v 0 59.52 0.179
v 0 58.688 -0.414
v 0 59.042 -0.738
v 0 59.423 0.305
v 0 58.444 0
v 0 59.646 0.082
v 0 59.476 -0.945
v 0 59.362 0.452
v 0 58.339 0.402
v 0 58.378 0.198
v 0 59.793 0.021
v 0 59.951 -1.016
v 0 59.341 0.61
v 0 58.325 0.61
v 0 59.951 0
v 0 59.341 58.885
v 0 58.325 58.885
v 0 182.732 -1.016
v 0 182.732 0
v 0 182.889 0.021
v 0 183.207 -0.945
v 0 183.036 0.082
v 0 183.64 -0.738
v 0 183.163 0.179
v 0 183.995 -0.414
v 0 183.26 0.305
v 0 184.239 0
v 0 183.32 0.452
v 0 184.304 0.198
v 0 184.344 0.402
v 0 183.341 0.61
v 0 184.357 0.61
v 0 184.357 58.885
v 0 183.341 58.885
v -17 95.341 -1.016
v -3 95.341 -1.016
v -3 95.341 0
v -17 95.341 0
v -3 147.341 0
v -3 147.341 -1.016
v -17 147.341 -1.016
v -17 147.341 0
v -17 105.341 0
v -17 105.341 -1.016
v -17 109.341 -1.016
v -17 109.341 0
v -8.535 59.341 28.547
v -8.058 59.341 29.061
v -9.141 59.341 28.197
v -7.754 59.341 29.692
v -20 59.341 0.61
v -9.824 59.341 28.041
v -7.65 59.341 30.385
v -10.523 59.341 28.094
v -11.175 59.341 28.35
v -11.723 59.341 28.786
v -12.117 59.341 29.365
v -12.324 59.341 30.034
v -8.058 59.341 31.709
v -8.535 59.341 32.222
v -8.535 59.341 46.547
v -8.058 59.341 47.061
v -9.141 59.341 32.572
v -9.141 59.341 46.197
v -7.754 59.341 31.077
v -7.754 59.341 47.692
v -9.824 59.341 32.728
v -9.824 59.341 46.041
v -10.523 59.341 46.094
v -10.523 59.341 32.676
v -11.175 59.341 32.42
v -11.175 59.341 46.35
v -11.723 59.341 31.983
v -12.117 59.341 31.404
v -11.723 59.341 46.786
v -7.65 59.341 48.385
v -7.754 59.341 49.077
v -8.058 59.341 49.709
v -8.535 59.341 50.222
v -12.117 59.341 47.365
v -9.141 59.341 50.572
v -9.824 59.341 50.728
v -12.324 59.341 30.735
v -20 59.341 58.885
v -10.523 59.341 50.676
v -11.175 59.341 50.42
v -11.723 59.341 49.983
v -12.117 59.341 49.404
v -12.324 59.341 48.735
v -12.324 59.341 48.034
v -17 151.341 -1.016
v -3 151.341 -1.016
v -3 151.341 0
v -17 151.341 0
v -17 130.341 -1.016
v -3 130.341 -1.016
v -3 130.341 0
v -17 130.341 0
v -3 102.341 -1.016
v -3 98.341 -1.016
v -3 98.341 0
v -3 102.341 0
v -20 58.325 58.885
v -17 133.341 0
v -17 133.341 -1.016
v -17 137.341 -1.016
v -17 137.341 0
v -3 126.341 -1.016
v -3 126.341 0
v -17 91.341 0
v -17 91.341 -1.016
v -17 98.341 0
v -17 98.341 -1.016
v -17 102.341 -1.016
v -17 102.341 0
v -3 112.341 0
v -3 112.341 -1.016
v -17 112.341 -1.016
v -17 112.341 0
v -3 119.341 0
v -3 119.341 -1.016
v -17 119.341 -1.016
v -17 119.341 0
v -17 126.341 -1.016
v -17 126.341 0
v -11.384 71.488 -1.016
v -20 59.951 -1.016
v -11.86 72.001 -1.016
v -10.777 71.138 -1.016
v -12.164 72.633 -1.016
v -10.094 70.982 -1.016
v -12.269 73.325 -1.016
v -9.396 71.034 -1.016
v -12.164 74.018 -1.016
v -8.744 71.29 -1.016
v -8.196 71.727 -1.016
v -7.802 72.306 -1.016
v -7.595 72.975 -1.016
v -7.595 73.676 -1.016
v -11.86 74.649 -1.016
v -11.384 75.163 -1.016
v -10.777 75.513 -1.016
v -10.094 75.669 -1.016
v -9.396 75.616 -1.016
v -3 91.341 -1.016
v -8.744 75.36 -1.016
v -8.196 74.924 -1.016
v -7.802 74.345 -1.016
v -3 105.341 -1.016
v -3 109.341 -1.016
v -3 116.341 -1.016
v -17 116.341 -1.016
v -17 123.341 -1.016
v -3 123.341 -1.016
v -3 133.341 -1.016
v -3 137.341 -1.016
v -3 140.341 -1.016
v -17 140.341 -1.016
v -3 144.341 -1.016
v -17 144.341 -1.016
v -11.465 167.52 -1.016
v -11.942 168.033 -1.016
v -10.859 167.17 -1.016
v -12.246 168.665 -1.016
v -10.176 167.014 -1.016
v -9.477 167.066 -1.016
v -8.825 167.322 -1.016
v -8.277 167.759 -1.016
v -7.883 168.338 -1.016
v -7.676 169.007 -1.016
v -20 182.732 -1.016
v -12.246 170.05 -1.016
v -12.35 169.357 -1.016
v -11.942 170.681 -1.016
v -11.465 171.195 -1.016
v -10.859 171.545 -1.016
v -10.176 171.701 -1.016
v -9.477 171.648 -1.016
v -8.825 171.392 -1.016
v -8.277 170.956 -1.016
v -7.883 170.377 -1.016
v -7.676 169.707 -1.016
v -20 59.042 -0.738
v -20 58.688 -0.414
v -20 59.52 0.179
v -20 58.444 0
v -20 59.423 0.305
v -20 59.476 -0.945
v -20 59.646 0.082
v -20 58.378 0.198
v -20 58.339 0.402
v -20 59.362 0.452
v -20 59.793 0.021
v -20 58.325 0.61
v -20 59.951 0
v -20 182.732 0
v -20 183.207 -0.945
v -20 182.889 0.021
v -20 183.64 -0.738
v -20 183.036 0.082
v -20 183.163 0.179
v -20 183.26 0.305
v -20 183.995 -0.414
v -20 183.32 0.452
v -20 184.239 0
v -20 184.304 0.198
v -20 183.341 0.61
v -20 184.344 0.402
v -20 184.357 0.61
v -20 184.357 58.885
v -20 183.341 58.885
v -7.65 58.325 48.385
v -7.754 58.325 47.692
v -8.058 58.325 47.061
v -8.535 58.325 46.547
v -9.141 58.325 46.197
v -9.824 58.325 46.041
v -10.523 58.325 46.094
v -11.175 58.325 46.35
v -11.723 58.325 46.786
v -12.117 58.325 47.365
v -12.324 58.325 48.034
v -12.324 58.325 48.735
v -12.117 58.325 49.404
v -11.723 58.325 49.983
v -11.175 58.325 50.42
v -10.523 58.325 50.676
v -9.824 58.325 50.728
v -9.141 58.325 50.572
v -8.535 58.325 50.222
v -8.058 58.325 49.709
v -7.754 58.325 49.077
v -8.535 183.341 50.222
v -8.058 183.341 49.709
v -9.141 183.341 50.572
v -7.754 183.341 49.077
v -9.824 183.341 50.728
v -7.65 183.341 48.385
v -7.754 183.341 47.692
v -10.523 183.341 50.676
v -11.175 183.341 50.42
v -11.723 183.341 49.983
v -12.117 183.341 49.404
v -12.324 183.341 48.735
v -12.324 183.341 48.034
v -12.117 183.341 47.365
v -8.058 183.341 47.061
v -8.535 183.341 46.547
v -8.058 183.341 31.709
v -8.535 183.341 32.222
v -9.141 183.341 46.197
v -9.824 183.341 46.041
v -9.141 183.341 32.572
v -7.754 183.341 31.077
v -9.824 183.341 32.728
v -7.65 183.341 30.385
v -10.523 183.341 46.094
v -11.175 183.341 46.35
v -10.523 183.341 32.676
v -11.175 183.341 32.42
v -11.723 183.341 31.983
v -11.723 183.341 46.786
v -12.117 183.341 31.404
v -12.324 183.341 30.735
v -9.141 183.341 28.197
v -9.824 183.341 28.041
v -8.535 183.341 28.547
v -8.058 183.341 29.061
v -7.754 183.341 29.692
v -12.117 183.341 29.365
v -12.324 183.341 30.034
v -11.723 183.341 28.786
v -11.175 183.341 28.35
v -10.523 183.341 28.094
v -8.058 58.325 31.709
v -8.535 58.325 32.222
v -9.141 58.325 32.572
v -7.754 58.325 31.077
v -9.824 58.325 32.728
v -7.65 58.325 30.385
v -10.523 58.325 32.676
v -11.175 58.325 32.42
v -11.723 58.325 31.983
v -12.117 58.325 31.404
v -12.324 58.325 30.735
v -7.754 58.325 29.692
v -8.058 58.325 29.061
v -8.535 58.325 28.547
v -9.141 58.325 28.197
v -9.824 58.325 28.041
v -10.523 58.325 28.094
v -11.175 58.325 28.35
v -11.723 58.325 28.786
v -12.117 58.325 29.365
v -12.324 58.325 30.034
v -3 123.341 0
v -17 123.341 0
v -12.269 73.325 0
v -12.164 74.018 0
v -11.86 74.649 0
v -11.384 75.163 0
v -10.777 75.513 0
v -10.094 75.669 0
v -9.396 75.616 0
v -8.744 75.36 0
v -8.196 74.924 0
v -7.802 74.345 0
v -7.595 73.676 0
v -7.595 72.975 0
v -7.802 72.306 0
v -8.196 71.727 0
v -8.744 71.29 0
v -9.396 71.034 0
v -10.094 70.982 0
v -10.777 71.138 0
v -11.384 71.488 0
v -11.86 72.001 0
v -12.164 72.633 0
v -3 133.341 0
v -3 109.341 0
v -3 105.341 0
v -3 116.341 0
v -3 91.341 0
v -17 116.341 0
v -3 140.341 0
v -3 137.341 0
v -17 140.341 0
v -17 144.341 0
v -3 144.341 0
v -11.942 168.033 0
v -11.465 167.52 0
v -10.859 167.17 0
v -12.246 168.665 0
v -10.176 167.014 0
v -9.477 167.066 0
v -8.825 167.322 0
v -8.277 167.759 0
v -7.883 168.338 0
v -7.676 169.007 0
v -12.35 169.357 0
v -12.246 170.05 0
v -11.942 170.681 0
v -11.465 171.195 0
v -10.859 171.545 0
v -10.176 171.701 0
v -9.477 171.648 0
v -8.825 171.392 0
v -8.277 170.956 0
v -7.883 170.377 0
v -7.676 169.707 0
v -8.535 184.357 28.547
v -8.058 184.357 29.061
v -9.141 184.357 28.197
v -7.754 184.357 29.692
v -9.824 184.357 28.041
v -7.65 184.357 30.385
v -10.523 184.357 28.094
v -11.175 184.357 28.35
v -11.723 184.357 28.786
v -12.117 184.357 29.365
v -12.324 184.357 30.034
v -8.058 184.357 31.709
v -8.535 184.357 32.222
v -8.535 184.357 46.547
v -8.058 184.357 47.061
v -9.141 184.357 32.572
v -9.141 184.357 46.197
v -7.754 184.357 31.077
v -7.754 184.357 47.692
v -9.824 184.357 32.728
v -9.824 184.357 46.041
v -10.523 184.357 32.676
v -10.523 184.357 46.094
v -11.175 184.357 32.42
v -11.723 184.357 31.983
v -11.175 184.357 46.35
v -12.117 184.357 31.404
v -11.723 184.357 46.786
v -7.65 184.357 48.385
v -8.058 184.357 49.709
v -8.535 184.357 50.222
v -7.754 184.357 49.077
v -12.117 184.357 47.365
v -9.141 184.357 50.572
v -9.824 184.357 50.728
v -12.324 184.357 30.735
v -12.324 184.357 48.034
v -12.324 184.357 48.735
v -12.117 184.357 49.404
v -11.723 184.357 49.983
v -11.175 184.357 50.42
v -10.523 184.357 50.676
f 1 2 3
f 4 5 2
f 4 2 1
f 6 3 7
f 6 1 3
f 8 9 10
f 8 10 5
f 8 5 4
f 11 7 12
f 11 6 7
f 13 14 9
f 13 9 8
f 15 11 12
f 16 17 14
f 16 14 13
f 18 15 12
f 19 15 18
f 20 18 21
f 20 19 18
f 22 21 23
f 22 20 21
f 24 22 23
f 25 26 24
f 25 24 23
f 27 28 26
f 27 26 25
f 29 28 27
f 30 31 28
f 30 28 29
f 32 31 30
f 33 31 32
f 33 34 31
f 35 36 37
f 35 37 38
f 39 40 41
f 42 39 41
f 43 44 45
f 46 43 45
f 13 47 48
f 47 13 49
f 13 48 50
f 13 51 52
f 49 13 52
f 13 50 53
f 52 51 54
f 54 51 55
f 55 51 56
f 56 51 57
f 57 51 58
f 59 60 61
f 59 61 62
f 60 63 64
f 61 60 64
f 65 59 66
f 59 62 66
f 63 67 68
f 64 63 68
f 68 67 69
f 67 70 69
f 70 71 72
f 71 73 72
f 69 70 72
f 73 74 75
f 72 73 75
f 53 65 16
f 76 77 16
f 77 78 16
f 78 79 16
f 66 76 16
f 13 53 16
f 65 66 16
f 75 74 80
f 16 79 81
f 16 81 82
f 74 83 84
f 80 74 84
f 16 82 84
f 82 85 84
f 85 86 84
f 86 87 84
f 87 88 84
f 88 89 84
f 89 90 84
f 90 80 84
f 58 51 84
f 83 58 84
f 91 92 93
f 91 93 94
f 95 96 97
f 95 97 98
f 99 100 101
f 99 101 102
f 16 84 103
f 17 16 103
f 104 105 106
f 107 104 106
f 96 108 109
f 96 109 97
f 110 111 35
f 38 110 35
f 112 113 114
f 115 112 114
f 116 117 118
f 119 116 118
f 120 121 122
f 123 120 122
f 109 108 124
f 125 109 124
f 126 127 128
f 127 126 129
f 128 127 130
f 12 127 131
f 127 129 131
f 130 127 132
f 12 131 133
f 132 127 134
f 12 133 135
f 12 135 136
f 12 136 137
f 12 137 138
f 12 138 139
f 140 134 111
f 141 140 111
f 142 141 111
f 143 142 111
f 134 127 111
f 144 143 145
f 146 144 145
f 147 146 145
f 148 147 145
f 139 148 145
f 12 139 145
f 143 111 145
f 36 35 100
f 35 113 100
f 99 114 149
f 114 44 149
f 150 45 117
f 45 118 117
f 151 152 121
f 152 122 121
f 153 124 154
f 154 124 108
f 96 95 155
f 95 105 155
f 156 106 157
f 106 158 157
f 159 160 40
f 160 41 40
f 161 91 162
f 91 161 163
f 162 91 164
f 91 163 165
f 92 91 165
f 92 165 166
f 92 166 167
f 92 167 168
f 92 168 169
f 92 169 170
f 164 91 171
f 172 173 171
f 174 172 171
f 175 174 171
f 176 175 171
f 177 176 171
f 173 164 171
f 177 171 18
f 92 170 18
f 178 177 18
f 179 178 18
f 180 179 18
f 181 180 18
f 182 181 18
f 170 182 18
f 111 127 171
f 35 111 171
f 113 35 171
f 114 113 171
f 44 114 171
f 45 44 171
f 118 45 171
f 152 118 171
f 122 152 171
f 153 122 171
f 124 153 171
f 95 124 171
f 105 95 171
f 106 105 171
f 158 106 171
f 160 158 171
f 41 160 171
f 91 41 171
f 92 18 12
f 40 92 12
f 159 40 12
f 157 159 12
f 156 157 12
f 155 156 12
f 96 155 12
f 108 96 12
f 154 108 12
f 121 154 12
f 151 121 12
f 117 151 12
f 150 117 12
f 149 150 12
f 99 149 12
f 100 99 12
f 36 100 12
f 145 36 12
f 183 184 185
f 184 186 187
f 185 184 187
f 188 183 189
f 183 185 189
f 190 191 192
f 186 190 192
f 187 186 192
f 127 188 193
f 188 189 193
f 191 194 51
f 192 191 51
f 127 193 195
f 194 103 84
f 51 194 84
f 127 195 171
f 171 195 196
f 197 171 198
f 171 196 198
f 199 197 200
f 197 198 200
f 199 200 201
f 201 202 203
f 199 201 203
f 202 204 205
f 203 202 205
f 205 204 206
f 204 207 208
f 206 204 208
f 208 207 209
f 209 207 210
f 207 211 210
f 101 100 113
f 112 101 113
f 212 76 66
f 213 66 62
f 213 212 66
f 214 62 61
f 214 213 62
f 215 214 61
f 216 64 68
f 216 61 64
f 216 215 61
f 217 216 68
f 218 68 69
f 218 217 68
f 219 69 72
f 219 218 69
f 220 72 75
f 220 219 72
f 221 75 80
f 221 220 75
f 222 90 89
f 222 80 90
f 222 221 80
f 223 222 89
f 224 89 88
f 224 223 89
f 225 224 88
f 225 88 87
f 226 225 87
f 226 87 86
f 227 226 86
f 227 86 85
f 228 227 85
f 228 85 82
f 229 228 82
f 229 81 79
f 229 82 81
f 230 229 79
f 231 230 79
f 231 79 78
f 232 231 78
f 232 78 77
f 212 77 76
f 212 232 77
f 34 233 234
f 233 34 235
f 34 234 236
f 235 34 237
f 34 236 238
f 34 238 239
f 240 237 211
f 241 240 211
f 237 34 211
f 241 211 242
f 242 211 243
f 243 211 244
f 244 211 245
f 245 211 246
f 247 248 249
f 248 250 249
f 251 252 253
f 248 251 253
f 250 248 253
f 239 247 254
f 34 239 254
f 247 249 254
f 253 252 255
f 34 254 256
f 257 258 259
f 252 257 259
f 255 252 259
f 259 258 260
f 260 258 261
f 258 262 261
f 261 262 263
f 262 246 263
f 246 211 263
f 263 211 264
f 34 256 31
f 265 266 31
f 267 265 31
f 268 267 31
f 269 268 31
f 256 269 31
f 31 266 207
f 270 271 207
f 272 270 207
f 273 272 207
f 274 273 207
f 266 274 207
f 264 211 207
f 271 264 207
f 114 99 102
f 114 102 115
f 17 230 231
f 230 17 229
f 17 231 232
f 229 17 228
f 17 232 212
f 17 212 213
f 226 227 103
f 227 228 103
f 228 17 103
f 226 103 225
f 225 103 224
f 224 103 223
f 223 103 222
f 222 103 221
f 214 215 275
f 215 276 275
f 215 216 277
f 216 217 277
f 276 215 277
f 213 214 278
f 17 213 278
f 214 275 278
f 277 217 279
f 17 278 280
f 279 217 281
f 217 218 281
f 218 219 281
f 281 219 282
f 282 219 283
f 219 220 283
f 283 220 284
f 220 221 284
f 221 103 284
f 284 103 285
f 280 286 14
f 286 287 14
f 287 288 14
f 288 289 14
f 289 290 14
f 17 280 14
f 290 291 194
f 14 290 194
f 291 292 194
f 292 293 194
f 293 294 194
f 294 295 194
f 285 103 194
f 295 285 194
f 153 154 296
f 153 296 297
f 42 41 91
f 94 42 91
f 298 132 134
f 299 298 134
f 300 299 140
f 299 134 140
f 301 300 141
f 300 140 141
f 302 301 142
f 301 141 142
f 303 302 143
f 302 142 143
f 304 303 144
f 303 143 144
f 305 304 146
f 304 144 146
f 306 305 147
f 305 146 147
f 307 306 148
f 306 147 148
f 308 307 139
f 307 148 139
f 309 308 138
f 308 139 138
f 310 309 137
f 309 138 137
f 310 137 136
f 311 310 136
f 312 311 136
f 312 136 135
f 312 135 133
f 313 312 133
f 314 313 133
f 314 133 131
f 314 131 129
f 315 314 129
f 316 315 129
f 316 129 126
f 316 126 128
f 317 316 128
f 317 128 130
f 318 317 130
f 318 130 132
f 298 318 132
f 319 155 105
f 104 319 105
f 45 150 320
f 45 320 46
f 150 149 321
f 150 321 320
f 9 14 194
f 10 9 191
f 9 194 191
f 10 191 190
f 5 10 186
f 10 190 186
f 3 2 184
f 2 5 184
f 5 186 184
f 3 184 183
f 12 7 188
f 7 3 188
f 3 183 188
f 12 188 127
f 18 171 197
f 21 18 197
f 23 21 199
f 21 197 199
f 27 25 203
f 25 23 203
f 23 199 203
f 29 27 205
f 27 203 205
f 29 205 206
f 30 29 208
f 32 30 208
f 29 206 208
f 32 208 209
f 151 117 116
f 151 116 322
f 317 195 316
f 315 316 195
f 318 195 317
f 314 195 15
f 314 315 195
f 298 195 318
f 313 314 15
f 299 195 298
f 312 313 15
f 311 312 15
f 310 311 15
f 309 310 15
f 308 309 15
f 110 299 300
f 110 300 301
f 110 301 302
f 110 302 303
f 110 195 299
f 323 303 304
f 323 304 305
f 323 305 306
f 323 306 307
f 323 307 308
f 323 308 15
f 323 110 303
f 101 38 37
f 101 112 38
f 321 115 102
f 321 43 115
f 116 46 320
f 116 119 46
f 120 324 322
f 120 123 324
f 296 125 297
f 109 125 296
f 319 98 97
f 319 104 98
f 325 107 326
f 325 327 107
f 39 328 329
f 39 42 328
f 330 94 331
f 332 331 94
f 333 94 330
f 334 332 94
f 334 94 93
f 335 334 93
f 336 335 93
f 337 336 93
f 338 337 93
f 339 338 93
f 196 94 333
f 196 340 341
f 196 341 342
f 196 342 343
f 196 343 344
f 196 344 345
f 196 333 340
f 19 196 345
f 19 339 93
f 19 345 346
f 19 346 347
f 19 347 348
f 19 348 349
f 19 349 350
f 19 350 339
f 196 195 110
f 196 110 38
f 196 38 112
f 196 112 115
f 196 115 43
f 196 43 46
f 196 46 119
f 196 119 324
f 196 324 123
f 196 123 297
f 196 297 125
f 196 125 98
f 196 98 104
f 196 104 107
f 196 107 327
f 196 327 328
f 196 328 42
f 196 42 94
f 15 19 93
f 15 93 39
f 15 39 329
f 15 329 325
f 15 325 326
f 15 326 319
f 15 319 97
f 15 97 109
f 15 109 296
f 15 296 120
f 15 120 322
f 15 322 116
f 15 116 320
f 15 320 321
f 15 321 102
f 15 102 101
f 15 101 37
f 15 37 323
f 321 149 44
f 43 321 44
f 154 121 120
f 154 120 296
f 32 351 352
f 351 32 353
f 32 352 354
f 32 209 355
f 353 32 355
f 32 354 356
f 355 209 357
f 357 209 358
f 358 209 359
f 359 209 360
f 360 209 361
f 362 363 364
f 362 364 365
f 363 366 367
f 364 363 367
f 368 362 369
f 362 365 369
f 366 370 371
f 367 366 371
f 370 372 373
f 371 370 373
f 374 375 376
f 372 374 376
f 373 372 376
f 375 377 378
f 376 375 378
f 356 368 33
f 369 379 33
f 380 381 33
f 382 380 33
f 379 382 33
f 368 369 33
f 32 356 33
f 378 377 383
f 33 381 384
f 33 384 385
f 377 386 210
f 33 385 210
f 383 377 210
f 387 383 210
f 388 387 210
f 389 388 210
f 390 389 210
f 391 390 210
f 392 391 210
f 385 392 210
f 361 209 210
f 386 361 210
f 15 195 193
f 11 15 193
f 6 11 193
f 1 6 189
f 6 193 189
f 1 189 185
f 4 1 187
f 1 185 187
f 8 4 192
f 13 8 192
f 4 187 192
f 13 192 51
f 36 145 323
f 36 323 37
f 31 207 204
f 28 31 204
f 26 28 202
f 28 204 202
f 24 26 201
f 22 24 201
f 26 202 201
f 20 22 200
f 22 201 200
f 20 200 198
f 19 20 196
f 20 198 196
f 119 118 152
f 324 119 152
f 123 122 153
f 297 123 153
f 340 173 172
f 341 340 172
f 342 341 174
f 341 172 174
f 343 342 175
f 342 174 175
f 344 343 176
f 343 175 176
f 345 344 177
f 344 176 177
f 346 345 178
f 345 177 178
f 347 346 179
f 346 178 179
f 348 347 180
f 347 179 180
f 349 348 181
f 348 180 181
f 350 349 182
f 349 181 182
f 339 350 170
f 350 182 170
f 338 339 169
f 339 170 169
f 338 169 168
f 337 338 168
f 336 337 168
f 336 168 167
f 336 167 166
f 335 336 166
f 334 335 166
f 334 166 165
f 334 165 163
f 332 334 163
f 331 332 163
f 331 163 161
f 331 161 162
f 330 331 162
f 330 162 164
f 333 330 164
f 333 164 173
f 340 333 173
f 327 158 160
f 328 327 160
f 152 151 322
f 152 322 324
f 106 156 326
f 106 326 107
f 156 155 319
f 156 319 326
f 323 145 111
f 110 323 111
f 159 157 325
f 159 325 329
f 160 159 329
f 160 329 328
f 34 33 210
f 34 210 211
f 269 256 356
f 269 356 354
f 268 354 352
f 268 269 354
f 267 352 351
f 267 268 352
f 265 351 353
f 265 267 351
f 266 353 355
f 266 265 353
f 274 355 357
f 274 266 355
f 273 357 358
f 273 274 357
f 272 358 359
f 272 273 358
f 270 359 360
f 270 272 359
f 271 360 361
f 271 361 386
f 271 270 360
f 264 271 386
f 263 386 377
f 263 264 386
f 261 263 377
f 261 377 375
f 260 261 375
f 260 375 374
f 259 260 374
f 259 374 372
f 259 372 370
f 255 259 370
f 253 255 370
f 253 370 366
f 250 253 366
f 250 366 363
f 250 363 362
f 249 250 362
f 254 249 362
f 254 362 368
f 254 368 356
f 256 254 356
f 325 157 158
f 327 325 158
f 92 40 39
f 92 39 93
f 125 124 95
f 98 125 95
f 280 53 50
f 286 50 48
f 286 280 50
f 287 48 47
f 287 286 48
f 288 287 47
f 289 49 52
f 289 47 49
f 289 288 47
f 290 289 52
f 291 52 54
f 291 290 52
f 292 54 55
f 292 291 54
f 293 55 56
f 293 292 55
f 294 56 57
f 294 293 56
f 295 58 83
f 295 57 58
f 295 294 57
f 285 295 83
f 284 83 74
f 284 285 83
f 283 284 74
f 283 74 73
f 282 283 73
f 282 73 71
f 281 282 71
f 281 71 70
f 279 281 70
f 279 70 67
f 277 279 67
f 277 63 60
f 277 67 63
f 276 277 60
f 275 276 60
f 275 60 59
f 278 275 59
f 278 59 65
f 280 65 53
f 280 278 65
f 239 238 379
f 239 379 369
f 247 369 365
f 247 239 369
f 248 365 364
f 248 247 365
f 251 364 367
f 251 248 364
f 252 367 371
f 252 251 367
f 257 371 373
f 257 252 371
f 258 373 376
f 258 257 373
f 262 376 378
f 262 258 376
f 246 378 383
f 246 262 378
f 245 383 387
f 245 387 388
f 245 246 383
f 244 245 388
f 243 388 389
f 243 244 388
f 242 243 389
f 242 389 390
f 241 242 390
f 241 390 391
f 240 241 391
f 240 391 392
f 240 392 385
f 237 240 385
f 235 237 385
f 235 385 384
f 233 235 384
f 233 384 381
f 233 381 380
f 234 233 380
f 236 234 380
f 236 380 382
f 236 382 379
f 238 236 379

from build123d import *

# Parameters (mm, degrees)
SKETCH1_W                  = 20
SKETCH1_H                  = 242.6825
SKETCH1_R                  = 2.35
BASE_FLANGE1_DEPTH         = 1.016
SKETCHED_START             = -20
SKETCHED_BEND1_DEPTH       = 20
SKETCHED_BEND1_2_DEPTH     = 7.6499999
SKETCHED_START_2           = -7.6499999
SKETCHED_BEND1_3_DEPTH     = 7.6499999
SKETCHED_START_3           = -12.3500001
SKETCHED_BEND1_4_DEPTH     = 4.7000002
SKETCHED_START_4           = 58.325262761
SKETCHED_BEND1_5_OUTLINE_R = 2.35
SKETCHED_BEND1_5_DEPTH     = 126.031974478
SKETCH7_R                  = 2.35
CUT_EXTRUDE1_DEPTH         = 10
SKETCH8_W                  = 14
SKETCH8_H                  = 4
CUT_EXTRUDE2_DEPTH         = 1.016


with BuildPart() as part:
    # Base-Flange1: sheet metal written as solids
    # Sketch1 → Base-Flange1 (new body)
    with BuildSketch(Plane.XY):
        with Locations((-10, 121.34125)):
            Rectangle(SKETCH1_W, SKETCH1_H)
        with Locations((-10, 28.5)):
            Circle(SKETCH1_R, mode=Mode.SUBTRACT)
        with Locations((-10, 10.5)):
            Circle(SKETCH1_R, mode=Mode.SUBTRACT)
        with Locations((-10, 232.1825)):
            Circle(SKETCH1_R, mode=Mode.SUBTRACT)
        with Locations((-10, 214.1825)):
            Circle(SKETCH1_R, mode=Mode.SUBTRACT)
    extrude(amount=-BASE_FLANGE1_DEPTH)

    # Sketched Bend1: read off the stored shape, not the designer's step
    # Sketched Bend1 outline → Sketched Bend1 (cut)
    with BuildSketch(Plane.YZ.offset(SKETCHED_START)):
        with BuildLine():
            ThreePointArc((184.238608772, 0), (183.640375265, -0.738276315), (182.731637239, -1.016))
            Line((182.731637239, -1.016), (242.6825, -1.016))
            Line((242.6825, -1.016), (242.6825, 0))
            Line((242.6825, 0), (184.238608772, 0))
        make_face()
        with BuildLine():
            Line((0, -1.016), (59.950862761, -1.016))
            ThreePointArc((59.950862761, -1.016), (59.042124735, -0.738276315), (58.443891228, 0))
            Line((58.443891228, 0), (0, 0))
            Line((0, 0), (0, -1.016))
        make_face()
    extrude(amount=SKETCHED_BEND1_DEPTH, mode=Mode.SUBTRACT)

    # Sketched Bend1 2 outline → Sketched Bend1 2 (add)
    with BuildSketch(Plane.YZ.offset(SKETCHED_START)):
        with BuildLine():
            Line((182.731637239, 0), (184.238608772, 0))
            ThreePointArc((184.238608772, 0), (184.327304542, 0.299082338), (184.357237239, 0.6096))
            Line((184.357237239, 0.6096), (184.357237239, 58.884737239))
            Line((184.357237239, 58.884737239), (183.341237239, 58.884737239))
            Line((183.341237239, 58.884737239), (183.341237239, 0.6096))
            ThreePointArc((183.341237239, 0.6096), (183.162689533, 0.178547706), (182.731637239, 0))
        make_face()
        with BuildLine():
            ThreePointArc((58.325262761, 0.6096), (58.355195458, 0.299082338), (58.443891228, 0))
            Line((58.443891228, 0), (59.950862761, 0))
            ThreePointArc((59.950862761, 0), (59.519810467, 0.178547706), (59.341262761, 0.6096))
            Line((59.341262761, 0.6096), (59.341262761, 58.884737239))
            Line((59.341262761, 58.884737239), (58.325262761, 58.884737239))
            Line((58.325262761, 58.884737239), (58.325262761, 0.6096))
        make_face()
    extrude(amount=SKETCHED_BEND1_2_DEPTH)

    # Sketched Bend1 3 outline → Sketched Bend1 3 (add)
    with BuildSketch(Plane.YZ.offset(SKETCHED_START_2)):
        with BuildLine():
            Line((182.731637239, 0), (184.238608772, 0))
            ThreePointArc((184.238608772, 0), (184.327304542, 0.299082338), (184.357237239, 0.6096))
            Line((184.357237239, 0.6096), (184.357237239, 58.884737239))
            Line((184.357237239, 58.884737239), (183.341237239, 58.884737239))
            Line((183.341237239, 58.884737239), (183.341237239, 0.6096))
            ThreePointArc((183.341237239, 0.6096), (183.162689533, 0.178547706), (182.731637239, 0))
        make_face()
        with BuildLine():
            ThreePointArc((58.325262761, 0.6096), (58.355195458, 0.299082338), (58.443891228, 0))
            Line((58.443891228, 0), (59.950862761, 0))
            ThreePointArc((59.950862761, 0), (59.519810467, 0.178547706), (59.341262761, 0.6096))
            Line((59.341262761, 0.6096), (59.341262761, 58.884737239))
            Line((59.341262761, 58.884737239), (58.325262761, 58.884737239))
            Line((58.325262761, 58.884737239), (58.325262761, 0.6096))
        make_face()
    extrude(amount=SKETCHED_BEND1_3_DEPTH)

    # Sketched Bend1 4 outline → Sketched Bend1 4 (add)
    with BuildSketch(Plane.YZ.offset(SKETCHED_START_3)):
        with BuildLine():
            Line((182.731637239, 0), (184.238608772, 0))
            ThreePointArc((184.238608772, 0), (184.327304542, 0.299082338), (184.357237239, 0.6096))
            Line((184.357237239, 0.6096), (184.357237239, 58.884737239))
            Line((184.357237239, 58.884737239), (183.341237239, 58.884737239))
            Line((183.341237239, 58.884737239), (183.341237239, 0.6096))
            ThreePointArc((183.341237239, 0.6096), (183.162689533, 0.178547706), (182.731637239, 0))
        make_face()
        with BuildLine():
            Line((58.443891228, 0), (59.950862761, 0))
            ThreePointArc((59.950862761, 0), (59.519810467, 0.178547706), (59.341262761, 0.6096))
            Line((59.341262761, 0.6096), (59.341262761, 58.884737239))
            Line((59.341262761, 58.884737239), (58.325262761, 58.884737239))
            Line((58.325262761, 58.884737239), (58.325262761, 0.6096))
            ThreePointArc((58.325262761, 0.6096), (58.355195458, 0.299082338), (58.443891228, 0))
        make_face()
    extrude(amount=SKETCHED_BEND1_4_DEPTH)

    # Sketched Bend1 5 outline → Sketched Bend1 5 (cut)
    with BuildSketch(Plane(origin=(0, 0, 0), x_dir=(1, 0, 0), z_dir=(0, 1, 0)).offset(SKETCHED_START_4)):
        with Locations((-10, -30.384737239)):
            Circle(SKETCHED_BEND1_5_OUTLINE_R)
        with Locations((-10, -48.384737239)):
            Circle(SKETCHED_BEND1_5_OUTLINE_R)
    extrude(amount=SKETCHED_BEND1_5_DEPTH, mode=Mode.SUBTRACT)

    # Sketch7 → Cut-Extrude1 (cut)
    with BuildSketch(Plane(origin=(0, 0, -1.016), x_dir=(-1, 0, 0), z_dir=(0, 0, -1))):
        with Locations((9.918784011, 73.325262761)):
            Circle(SKETCH7_R)
        with Locations((10, 169.357237239)):
            Circle(SKETCH7_R)
    extrude(amount=-CUT_EXTRUDE1_DEPTH, mode=Mode.SUBTRACT)

    # Sketch8 → Cut-Extrude2 (cut)
    with BuildSketch(Plane(origin=(0, 0, -1.016), x_dir=(-1, 0, 0), z_dir=(0, 0, -1))):
        with Locations((10, 149.34125)):
            Rectangle(SKETCH8_W, SKETCH8_H)
        with Locations((10, 142.34125)):
            Rectangle(SKETCH8_W, SKETCH8_H)
        with Locations((10, 135.34125)):
            Rectangle(SKETCH8_W, SKETCH8_H)
        with Locations((10, 128.34125)):
            Rectangle(SKETCH8_W, SKETCH8_H)
        with Locations((10, 121.34125)):
            Rectangle(SKETCH8_W, SKETCH8_H)
        with Locations((10, 114.34125)):
            Rectangle(SKETCH8_W, SKETCH8_H)
        with Locations((10, 107.34125)):
            Rectangle(SKETCH8_W, SKETCH8_H)
        with Locations((10, 100.34125)):
            Rectangle(SKETCH8_W, SKETCH8_H)
        with Locations((10, 93.34125)):
            Rectangle(SKETCH8_W, SKETCH8_H)
    extrude(amount=-CUT_EXTRUDE2_DEPTH, mode=Mode.SUBTRACT)


solid = part.part
